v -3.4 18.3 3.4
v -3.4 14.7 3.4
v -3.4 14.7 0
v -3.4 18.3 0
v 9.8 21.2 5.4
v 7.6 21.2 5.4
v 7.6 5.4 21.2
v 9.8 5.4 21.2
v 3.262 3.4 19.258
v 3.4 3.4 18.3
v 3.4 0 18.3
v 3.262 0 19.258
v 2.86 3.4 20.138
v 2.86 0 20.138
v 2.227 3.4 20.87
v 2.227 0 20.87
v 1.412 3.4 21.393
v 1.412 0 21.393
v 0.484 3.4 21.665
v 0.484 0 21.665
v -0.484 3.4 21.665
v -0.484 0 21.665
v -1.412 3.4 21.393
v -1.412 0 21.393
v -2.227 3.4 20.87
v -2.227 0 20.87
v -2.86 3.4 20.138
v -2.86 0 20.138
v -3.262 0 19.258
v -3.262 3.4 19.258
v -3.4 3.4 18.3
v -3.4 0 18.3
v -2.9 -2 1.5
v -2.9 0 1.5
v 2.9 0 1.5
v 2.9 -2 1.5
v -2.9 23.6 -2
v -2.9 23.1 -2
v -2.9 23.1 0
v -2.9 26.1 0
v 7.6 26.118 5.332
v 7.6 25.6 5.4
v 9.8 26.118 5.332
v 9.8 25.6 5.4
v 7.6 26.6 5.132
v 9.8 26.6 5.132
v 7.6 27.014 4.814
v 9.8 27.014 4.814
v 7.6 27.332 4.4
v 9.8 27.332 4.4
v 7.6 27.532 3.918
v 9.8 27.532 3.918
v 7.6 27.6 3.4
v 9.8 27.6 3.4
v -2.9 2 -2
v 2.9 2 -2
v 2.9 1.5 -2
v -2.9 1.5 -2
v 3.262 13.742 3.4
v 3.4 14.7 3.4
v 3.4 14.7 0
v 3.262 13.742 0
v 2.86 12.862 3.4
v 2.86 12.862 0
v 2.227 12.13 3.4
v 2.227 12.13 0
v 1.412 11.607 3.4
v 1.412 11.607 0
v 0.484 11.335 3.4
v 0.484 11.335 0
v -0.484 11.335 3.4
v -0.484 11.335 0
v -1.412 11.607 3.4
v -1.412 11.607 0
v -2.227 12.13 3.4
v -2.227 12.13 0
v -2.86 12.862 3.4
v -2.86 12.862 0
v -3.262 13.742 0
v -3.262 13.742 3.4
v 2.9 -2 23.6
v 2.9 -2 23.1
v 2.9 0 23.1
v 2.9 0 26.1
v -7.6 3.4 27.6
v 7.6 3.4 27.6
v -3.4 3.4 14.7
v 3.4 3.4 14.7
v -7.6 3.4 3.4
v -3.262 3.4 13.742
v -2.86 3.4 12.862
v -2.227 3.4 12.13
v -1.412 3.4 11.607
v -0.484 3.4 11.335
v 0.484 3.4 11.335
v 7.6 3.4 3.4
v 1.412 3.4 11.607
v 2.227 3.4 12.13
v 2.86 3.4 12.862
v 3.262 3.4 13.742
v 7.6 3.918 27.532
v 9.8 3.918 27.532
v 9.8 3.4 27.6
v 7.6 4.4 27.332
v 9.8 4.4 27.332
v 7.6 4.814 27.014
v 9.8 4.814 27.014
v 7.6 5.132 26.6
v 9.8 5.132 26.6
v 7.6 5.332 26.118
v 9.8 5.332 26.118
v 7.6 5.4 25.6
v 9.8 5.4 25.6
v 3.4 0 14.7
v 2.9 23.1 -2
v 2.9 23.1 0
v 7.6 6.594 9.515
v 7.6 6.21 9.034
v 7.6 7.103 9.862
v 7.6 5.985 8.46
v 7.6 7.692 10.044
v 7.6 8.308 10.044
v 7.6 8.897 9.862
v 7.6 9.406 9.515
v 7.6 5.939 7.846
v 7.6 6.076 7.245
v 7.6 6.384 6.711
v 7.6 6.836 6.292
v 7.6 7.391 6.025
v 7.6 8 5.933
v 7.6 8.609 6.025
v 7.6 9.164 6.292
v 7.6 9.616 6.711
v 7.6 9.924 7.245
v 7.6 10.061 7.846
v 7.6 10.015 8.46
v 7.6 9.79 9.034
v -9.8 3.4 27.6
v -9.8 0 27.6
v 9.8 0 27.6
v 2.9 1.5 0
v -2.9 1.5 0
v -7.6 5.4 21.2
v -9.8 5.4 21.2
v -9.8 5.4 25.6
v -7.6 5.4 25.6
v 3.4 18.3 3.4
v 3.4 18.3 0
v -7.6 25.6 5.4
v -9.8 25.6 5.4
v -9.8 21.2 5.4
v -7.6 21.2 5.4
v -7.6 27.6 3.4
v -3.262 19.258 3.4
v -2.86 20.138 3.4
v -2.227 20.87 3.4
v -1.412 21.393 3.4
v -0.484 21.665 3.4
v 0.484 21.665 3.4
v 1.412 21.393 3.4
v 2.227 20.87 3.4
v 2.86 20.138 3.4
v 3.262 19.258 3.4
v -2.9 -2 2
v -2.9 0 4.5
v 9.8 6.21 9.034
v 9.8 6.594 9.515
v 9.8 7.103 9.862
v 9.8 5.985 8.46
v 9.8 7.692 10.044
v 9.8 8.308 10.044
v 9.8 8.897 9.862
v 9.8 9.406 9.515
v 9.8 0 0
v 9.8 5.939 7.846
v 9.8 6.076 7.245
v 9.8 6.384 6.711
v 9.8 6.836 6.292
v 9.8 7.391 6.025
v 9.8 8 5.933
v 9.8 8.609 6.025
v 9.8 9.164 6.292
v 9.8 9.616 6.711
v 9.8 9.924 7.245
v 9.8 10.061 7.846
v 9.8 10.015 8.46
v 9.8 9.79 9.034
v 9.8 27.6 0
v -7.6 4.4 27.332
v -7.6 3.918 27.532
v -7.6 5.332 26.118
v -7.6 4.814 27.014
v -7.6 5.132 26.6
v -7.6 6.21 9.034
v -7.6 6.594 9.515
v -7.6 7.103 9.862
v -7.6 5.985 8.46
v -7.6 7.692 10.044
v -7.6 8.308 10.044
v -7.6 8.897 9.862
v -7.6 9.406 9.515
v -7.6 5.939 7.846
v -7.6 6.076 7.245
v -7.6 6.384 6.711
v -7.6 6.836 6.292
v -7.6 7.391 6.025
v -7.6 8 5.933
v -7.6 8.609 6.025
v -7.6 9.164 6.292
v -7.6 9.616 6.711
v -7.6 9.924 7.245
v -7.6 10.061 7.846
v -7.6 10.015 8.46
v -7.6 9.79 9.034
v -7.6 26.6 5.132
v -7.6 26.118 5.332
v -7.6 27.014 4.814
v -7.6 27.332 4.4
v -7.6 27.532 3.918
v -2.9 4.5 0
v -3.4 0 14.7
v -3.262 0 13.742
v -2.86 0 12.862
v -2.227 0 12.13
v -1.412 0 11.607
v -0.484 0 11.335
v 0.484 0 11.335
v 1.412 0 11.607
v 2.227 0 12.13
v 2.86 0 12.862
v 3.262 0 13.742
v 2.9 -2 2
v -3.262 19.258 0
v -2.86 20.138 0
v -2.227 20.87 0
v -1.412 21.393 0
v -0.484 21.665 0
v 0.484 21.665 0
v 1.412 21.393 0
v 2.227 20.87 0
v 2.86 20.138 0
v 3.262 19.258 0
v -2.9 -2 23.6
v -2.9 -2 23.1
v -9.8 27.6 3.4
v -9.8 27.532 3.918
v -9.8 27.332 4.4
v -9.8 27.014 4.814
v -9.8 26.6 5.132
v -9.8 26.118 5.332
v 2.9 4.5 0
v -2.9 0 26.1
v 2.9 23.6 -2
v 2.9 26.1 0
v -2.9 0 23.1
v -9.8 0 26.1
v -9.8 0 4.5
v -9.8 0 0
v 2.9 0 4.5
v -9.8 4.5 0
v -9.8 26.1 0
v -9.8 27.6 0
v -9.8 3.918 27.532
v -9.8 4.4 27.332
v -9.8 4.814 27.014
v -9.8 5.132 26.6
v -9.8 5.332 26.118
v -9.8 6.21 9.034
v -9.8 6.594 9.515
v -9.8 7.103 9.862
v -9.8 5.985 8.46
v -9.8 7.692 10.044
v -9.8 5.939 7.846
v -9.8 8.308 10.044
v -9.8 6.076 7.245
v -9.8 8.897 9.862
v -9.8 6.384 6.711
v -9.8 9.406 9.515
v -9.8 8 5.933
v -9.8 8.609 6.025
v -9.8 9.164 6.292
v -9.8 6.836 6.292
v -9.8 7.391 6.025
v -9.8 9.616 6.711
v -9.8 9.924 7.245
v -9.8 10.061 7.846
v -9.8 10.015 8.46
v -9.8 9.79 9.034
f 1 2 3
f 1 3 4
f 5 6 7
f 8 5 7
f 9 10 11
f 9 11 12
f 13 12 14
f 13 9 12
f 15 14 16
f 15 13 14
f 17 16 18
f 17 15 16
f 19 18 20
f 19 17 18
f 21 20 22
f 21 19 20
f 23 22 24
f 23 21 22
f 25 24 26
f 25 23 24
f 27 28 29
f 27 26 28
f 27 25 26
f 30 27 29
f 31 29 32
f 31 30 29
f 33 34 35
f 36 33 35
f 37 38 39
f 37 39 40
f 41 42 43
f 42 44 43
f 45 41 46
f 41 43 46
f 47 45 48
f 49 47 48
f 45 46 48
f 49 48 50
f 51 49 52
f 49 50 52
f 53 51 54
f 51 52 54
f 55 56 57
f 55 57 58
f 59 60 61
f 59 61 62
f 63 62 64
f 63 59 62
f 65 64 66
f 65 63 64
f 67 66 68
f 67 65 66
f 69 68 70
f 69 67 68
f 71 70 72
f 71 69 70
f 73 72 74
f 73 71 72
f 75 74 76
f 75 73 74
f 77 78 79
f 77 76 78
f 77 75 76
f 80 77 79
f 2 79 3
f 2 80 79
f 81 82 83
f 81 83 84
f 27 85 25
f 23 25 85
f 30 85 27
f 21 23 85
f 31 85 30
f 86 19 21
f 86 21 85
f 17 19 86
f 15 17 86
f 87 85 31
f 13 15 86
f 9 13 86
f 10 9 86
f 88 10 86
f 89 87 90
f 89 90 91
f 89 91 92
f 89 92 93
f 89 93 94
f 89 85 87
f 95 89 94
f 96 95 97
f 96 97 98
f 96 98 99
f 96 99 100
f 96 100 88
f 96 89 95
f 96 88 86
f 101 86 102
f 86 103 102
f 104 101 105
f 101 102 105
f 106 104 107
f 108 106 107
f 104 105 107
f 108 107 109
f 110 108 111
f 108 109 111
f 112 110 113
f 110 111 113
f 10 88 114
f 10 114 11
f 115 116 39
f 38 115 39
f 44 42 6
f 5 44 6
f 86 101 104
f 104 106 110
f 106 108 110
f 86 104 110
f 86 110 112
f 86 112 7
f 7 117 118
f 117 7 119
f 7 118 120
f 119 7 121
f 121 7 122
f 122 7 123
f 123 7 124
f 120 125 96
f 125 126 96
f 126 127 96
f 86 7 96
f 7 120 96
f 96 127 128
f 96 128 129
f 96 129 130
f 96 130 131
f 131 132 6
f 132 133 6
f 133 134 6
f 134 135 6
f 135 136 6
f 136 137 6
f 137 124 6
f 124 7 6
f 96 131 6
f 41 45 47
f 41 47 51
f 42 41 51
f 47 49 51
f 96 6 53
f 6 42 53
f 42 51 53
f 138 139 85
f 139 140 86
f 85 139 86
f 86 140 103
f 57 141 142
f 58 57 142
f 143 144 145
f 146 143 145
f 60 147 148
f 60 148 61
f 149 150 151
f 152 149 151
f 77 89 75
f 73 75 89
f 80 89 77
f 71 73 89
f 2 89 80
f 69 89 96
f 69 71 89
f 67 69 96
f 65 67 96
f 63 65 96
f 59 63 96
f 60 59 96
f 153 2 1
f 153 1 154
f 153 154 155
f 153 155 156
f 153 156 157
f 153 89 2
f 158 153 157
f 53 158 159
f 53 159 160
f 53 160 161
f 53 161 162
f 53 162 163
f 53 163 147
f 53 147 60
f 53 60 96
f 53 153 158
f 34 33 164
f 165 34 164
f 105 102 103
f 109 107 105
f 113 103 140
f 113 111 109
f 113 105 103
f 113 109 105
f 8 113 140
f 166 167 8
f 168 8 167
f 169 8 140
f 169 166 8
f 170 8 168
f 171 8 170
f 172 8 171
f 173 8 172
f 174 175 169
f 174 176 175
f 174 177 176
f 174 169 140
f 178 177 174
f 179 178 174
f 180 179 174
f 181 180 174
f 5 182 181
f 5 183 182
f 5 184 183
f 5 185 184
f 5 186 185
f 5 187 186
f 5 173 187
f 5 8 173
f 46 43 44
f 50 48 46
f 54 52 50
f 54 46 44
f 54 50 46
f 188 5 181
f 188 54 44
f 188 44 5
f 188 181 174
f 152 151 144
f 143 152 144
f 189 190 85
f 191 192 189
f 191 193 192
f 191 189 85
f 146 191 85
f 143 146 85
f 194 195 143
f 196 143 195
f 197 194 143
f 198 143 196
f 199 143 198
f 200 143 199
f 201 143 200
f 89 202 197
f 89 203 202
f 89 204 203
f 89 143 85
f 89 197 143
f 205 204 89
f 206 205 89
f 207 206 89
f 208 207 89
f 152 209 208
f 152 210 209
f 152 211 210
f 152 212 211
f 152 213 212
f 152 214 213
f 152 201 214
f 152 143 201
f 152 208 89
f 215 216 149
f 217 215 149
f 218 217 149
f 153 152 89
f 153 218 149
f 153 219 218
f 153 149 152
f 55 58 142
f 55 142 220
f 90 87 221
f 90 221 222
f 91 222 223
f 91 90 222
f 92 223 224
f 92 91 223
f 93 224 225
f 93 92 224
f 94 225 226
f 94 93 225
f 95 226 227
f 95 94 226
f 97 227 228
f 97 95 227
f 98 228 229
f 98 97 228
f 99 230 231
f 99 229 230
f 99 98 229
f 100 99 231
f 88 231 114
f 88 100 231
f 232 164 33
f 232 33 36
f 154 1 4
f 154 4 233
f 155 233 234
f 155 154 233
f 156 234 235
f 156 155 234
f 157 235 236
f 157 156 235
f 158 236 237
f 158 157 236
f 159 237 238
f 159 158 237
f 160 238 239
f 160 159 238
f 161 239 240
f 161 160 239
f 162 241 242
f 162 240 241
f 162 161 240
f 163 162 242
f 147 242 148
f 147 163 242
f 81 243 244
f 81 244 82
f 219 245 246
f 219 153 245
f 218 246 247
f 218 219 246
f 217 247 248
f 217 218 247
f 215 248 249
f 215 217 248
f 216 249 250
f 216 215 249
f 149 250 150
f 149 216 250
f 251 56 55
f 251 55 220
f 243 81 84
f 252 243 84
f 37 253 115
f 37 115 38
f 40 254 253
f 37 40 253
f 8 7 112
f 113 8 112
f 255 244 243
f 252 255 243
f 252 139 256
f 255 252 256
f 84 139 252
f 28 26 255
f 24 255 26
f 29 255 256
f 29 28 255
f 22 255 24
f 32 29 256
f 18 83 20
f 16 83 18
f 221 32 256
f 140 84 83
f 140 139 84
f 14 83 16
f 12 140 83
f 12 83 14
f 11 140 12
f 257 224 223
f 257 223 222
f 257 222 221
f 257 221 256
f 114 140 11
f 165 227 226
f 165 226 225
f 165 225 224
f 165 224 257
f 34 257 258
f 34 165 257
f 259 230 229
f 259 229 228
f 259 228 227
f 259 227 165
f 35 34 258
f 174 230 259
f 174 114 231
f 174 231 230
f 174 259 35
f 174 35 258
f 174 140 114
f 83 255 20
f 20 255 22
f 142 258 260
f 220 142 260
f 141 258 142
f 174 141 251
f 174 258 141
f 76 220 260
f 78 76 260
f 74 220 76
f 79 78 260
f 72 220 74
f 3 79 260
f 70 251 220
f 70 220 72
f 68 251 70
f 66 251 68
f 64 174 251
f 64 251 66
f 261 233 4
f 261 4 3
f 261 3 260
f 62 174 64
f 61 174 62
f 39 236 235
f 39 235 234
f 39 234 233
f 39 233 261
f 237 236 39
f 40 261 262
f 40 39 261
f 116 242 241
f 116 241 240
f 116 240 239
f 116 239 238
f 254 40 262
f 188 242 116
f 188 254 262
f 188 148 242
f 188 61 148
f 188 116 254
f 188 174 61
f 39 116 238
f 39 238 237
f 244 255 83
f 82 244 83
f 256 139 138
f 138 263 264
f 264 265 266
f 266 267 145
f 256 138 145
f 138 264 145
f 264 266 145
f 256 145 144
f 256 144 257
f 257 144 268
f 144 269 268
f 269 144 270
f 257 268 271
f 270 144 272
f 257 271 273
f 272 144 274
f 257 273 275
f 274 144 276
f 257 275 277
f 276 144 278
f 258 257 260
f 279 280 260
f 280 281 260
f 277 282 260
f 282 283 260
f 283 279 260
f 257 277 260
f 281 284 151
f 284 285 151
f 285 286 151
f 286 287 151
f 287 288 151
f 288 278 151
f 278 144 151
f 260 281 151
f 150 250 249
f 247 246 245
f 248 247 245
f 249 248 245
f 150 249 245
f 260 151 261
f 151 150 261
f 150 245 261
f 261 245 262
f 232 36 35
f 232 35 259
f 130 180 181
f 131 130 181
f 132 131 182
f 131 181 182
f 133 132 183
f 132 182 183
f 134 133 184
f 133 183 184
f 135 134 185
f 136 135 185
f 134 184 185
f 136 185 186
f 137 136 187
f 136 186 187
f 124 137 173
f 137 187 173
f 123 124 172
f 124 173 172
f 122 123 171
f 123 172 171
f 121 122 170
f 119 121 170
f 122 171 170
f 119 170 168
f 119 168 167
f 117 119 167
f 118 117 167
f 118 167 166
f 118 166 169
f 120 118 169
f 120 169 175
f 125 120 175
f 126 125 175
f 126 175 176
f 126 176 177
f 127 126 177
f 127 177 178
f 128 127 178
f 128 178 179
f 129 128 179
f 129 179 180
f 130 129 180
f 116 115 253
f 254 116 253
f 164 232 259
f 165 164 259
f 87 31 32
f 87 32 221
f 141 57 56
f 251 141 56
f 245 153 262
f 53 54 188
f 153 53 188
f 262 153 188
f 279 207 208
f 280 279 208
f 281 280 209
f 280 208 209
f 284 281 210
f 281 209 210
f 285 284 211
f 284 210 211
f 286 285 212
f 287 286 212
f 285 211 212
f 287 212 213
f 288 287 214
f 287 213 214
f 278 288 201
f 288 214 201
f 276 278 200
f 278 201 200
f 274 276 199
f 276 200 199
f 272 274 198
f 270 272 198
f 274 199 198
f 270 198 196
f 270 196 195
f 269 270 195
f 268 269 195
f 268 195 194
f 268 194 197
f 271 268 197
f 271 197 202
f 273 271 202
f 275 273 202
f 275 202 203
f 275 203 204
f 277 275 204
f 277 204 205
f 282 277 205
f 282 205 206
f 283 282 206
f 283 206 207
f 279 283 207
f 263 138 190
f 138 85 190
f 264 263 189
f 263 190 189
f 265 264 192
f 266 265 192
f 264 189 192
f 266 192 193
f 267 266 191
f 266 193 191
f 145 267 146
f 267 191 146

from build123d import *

# Parameters (mm, degrees)
SKETCH1_W           = 27.6
SKETCH1_H           = 27.6
BOSS_EXTRUDE1_DEPTH = 9.8
CUT_EXTRUDE1_DEPTH  = 44.676996234
SKETCH3_W           = 15.2
SKETCH3_H           = 24.2
CUT_EXTRUDE2_DEPTH  = 24.2
CUT_EXTRUDE3_DEPTH  = 44.676996234
FILLET110_R         = 2
CUT_EXTRUDE4_DEPTH  = 38.992630864
CUT_EXTRUDE5_DEPTH  = 38.992630864
SKETCH7_W           = 5.8
SKETCH7_H           = 3
BOSS_EXTRUDE2_DEPTH = 2
SKETCH8_W           = 5.8
SKETCH8_H           = 3
BOSS_EXTRUDE3_DEPTH = 2
CUT_EXTRUDE6_DEPTH  = 42.046437117
TAP101_D            = 4.134


with BuildPart() as part:
    # Sketch1 → Boss-Extrude1 (new, symmetric)
    with BuildSketch(Plane(origin=(0, 0, 0), x_dir=(0, 0, -1), z_dir=(1, 0, 0))):
        with Locations((-13.8, 13.8)):
            Rectangle(SKETCH1_W, SKETCH1_H)
    extrude(amount=BOSS_EXTRUDE1_DEPTH, both=True)

    # Sketch2 → Cut-Extrude1 (cut, through all)
    with BuildSketch(Plane.ZY.offset(9.8)):
        Polygon((27.6, 27.6), (5.4, 27.6), (27.6, 5.4), align=None)
    extrude(amount=-CUT_EXTRUDE1_DEPTH, mode=Mode.SUBTRACT)

    # Sketch3 → Cut-Extrude2 (cut)
    with BuildSketch(Plane(origin=(0, 27.6, 0), x_dir=(1, 0, 0), z_dir=(0, 1, 0))):
        with Locations((0, -15.5)):
            Rectangle(SKETCH3_W, SKETCH3_H)
    extrude(amount=-CUT_EXTRUDE2_DEPTH, mode=Mode.SUBTRACT)

    # Sketch4 → Cut-Extrude3 (cut, through all)
    with BuildSketch(Plane.ZY.offset(9.8)):
        Polygon((5.4, 27.6), (5.4, 21.2), (21.2, 5.4), (27.6, 5.4), align=None)
    extrude(amount=-CUT_EXTRUDE3_DEPTH, mode=Mode.SUBTRACT)

    # Fillet110
    fillet110_edges = [part.edges().sort_by_distance(p)[0] for p in [
        (8.7, 5.4, 27.6),
        (-8.7, 5.4, 27.6),
        (8.7, 27.6, 5.4),
        (-8.7, 27.6, 5.4),
    ]]
    fillet(fillet110_edges, radius=FILLET110_R)

    # Sketch5 → Cut-Extrude4 (cut, through all)
    with BuildSketch(Plane.XY.offset(3.4)):
        with BuildLine():
            Line((-3.4, 14.7), (-3.4, 18.3))
            ThreePointArc((-3.4, 18.3), (0, 21.7), (3.4, 18.3))
            Line((3.4, 18.3), (3.4, 14.7))
            ThreePointArc((3.4, 14.7), (0, 11.3), (-3.4, 14.7))
        make_face()
    extrude(amount=-CUT_EXTRUDE4_DEPTH, mode=Mode.SUBTRACT)

    # Sketch6 → Cut-Extrude5 (cut, through all)
    with BuildSketch(Plane(origin=(0, 3.4, 0), x_dir=(1, 0, 0), z_dir=(0, 1, 0))):
        with BuildLine():
            Line((3.4, -14.7), (3.4, -18.3))
            ThreePointArc((3.4, -18.3), (0, -21.7), (-3.4, -18.3))
            Line((-3.4, -18.3), (-3.4, -14.7))
            ThreePointArc((-3.4, -14.7), (0, -11.3), (3.4, -14.7))
        make_face()
    extrude(amount=-CUT_EXTRUDE5_DEPTH, mode=Mode.SUBTRACT)

    # Sketch7 → Boss-Extrude2 (add)
    with BuildSketch(Plane(origin=(0, 0, 0), x_dir=(-1, 0, 0), z_dir=(0, 0, -1))):
        with Locations((0, 24.6)):
            Rectangle(SKETCH7_W, SKETCH7_H)
        with Locations((0, 3)):
            Rectangle(SKETCH7_W, SKETCH7_H)
    extrude(amount=BOSS_EXTRUDE2_DEPTH)

    # Sketch8 → Boss-Extrude3 (add)
    with BuildSketch(Plane.XZ):
        with Locations((0, 24.6)):
            Rectangle(SKETCH8_W, SKETCH8_H)
        with Locations((0, 3)):
            Rectangle(SKETCH8_W, SKETCH8_H)
    extrude(amount=BOSS_EXTRUDE3_DEPTH)

    # Sketch9 → Cut-Extrude6 (cut, through all)
    with BuildSketch(Plane(origin=(2.9, 0, 0), x_dir=(0, 0, -1), z_dir=(1, 0, 0))):
        Polygon((0, 26.1), (2, 23.6), (2, 26.1), align=None)
        Polygon((0, 4.5), (2, 4.5), (2, 2), align=None)
        Polygon((-26.1, 0), (-26.1, -2), (-23.6, -2), align=None)
        Polygon((-4.5, 0), (-4.5, -2), (-2, -2), align=None)
    extrude(amount=-CUT_EXTRUDE6_DEPTH, mode=Mode.SUBTRACT)

    # Tap101 (through all)
    with Locations(Plane.ZY.offset(9.8)):
        with Locations((8, 8)):
            Hole(TAP101_D / 2)


solid = part.part
